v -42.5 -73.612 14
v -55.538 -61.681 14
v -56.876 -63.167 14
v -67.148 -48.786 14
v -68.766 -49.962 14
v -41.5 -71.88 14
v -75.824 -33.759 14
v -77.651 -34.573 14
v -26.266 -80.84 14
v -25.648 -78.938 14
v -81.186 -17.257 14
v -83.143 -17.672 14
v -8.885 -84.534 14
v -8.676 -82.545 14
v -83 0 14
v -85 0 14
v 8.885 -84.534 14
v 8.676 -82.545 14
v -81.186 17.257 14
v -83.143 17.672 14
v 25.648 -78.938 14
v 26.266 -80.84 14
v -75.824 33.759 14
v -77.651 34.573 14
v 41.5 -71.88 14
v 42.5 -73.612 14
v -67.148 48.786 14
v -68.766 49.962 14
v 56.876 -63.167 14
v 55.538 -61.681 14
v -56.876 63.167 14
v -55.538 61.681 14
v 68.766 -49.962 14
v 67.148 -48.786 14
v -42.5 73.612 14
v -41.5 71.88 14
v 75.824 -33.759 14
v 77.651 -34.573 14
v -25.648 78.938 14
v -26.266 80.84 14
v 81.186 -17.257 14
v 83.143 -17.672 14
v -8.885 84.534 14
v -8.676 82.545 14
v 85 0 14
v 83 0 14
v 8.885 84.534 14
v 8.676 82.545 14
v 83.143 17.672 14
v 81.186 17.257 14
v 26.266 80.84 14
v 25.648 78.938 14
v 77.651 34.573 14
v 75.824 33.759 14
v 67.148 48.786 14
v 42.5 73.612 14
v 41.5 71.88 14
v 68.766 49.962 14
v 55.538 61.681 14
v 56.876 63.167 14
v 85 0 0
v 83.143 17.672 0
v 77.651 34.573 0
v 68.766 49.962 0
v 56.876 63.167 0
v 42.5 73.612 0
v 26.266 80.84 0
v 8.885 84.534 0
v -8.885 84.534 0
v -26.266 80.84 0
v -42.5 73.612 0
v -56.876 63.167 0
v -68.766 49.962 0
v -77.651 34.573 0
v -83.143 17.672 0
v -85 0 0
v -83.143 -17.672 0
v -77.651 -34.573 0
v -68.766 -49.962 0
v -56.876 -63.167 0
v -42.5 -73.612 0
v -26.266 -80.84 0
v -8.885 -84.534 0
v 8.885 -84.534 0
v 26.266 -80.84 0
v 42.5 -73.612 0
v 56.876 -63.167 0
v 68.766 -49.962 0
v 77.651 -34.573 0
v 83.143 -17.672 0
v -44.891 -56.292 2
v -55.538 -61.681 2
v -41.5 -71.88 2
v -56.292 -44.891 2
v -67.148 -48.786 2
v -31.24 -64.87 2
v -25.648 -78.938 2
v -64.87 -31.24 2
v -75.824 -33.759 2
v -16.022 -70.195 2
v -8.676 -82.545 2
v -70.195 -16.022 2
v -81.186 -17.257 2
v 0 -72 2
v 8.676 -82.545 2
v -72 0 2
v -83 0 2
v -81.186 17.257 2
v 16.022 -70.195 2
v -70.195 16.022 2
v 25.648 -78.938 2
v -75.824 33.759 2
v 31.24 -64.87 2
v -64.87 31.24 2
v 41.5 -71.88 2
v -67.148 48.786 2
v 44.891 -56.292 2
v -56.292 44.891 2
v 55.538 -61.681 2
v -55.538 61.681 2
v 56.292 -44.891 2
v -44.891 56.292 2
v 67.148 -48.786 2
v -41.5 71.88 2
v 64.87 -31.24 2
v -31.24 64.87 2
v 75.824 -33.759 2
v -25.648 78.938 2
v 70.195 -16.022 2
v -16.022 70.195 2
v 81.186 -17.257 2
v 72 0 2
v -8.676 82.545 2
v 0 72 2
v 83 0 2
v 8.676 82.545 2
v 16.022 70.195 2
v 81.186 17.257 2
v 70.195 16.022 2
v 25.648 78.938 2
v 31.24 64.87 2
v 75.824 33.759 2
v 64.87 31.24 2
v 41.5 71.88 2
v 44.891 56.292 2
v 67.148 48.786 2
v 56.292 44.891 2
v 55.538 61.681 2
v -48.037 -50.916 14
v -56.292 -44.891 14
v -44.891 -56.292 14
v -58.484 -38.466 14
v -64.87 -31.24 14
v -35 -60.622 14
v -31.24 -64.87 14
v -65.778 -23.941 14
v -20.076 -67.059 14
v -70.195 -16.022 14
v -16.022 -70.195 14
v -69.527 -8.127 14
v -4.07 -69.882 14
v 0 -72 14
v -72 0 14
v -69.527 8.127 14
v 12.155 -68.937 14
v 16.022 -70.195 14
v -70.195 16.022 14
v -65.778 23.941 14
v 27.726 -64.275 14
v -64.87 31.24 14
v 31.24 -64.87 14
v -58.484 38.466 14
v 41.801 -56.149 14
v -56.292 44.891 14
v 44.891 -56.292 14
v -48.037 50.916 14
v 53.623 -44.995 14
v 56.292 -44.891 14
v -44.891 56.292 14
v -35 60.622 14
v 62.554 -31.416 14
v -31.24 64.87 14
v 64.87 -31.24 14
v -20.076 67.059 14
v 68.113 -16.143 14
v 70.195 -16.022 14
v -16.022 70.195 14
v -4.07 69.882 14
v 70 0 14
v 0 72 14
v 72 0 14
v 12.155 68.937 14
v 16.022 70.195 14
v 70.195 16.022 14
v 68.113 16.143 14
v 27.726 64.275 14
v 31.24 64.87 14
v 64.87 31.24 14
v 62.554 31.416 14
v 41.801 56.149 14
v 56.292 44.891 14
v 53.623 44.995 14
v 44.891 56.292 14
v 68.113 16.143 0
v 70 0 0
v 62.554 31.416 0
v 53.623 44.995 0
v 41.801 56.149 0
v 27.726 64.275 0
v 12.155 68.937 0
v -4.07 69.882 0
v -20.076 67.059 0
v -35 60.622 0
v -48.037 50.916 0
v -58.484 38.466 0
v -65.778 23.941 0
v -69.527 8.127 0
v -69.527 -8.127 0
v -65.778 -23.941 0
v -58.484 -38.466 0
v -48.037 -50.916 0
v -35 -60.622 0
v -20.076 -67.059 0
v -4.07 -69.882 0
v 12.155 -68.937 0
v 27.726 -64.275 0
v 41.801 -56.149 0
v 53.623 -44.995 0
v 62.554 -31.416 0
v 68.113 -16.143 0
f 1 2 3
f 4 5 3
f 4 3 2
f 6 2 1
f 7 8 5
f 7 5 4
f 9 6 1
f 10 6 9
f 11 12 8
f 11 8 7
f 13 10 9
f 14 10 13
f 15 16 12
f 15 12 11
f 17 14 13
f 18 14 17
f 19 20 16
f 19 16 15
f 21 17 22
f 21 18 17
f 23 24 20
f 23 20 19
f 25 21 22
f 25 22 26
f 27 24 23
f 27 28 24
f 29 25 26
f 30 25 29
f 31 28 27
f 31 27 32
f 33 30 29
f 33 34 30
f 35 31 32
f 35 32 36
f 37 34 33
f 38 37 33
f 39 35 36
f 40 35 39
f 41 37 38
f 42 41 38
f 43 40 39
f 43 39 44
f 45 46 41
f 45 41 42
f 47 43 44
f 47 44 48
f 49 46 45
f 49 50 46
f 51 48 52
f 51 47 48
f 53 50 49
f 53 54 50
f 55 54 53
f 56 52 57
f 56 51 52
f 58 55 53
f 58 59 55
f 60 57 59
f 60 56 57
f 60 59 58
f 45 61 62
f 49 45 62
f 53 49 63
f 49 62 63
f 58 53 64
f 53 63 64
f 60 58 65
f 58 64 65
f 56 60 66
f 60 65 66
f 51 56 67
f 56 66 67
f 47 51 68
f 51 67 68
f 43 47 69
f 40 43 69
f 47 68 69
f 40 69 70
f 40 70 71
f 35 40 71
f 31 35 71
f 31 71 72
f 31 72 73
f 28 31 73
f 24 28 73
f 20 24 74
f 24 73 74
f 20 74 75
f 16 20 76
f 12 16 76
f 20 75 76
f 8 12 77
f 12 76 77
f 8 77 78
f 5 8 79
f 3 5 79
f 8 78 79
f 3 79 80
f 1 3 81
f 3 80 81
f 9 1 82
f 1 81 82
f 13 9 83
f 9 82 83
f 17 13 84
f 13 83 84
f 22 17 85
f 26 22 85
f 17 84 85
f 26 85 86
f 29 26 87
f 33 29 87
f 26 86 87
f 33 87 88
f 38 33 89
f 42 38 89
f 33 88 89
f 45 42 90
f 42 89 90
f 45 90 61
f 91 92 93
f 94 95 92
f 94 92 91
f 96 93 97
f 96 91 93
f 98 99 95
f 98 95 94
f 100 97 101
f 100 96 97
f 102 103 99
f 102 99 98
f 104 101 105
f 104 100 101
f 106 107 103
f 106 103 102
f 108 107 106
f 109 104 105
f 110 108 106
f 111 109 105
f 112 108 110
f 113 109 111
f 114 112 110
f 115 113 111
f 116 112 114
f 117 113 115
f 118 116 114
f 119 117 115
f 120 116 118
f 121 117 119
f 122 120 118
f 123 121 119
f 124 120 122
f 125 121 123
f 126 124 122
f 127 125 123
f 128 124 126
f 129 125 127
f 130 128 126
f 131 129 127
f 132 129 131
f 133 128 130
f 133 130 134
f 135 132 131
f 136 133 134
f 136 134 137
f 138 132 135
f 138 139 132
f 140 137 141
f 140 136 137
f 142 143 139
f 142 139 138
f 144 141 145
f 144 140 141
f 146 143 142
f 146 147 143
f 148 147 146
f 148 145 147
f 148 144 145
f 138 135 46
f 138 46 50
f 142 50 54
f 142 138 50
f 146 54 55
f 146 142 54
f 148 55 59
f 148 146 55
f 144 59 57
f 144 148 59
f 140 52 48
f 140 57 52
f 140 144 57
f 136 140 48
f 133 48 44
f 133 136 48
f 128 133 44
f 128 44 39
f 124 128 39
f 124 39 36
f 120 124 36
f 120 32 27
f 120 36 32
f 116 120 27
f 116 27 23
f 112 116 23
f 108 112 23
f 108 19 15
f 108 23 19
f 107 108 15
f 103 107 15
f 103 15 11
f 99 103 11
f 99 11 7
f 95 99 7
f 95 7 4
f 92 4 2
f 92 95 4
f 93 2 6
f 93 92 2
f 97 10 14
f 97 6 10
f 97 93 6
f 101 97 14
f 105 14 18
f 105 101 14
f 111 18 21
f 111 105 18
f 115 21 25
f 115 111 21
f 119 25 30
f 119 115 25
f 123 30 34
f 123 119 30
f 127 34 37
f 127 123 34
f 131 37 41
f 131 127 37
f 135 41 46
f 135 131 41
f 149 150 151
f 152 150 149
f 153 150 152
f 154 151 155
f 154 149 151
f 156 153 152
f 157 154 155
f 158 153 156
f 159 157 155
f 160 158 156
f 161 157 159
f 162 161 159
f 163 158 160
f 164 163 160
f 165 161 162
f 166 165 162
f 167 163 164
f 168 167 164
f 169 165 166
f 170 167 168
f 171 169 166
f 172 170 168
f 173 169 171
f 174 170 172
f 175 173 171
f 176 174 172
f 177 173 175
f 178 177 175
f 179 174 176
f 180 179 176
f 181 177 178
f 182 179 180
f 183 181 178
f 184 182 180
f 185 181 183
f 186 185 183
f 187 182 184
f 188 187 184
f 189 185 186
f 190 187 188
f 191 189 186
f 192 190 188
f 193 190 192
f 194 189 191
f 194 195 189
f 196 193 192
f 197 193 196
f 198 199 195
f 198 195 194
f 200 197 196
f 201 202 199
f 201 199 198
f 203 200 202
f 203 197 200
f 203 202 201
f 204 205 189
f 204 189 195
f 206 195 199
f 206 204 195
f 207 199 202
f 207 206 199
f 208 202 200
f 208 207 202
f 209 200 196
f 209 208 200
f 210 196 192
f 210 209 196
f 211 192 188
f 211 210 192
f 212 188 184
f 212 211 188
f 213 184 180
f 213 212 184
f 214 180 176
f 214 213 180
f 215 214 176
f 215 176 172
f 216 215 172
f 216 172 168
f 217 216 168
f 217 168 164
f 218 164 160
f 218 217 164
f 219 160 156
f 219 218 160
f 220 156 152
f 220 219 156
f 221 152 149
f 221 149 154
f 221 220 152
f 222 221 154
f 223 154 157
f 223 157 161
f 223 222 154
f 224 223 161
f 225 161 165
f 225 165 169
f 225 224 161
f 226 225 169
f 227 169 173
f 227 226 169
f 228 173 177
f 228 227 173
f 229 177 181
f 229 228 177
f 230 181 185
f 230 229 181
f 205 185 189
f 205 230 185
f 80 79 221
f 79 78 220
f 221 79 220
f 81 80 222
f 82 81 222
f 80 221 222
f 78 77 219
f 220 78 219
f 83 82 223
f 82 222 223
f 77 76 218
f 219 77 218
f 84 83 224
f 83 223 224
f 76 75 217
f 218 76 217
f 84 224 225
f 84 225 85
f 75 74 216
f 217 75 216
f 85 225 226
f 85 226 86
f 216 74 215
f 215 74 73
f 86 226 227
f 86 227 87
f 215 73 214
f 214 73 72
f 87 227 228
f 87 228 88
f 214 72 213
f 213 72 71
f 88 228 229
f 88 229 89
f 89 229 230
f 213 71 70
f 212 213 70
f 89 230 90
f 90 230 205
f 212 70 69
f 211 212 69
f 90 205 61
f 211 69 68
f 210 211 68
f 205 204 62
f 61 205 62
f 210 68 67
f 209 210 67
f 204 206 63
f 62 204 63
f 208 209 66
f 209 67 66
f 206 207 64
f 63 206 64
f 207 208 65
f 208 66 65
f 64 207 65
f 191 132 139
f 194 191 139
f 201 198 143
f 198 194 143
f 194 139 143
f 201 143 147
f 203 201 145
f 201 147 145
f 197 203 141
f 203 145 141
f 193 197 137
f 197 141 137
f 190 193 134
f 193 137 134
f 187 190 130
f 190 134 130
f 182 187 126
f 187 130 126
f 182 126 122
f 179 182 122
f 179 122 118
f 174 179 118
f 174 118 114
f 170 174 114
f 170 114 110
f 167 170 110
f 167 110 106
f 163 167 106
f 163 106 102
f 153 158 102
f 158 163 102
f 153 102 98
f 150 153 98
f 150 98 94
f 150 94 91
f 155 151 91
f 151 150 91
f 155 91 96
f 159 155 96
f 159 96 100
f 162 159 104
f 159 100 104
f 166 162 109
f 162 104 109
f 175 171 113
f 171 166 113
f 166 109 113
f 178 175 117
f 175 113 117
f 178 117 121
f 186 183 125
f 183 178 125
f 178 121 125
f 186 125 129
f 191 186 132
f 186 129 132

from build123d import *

# Parameters (mm, degrees)
SKETCH_1_R      = 85
SKETCH_1_R_2    = 70
EXTRUDE_1_DEPTH = 14
SHELL_1_T       = -2


with BuildPart() as part:
    # 草图1 → 凸台-拉伸1 (new body)
    with BuildSketch(Plane.XY):
        Circle(SKETCH_1_R)
        Circle(SKETCH_1_R_2, mode=Mode.SUBTRACT)
    extrude(amount=EXTRUDE_1_DEPTH)

    # 抽壳1
    shell_1_openings = [part.faces().sort_by_distance(p)[0] for p in [
        (-82.595836944, 0, 14),
    ]]
    offset(amount=SHELL_1_T, openings=shell_1_openings, kind=Kind.INTERSECTION)


solid = part.part
